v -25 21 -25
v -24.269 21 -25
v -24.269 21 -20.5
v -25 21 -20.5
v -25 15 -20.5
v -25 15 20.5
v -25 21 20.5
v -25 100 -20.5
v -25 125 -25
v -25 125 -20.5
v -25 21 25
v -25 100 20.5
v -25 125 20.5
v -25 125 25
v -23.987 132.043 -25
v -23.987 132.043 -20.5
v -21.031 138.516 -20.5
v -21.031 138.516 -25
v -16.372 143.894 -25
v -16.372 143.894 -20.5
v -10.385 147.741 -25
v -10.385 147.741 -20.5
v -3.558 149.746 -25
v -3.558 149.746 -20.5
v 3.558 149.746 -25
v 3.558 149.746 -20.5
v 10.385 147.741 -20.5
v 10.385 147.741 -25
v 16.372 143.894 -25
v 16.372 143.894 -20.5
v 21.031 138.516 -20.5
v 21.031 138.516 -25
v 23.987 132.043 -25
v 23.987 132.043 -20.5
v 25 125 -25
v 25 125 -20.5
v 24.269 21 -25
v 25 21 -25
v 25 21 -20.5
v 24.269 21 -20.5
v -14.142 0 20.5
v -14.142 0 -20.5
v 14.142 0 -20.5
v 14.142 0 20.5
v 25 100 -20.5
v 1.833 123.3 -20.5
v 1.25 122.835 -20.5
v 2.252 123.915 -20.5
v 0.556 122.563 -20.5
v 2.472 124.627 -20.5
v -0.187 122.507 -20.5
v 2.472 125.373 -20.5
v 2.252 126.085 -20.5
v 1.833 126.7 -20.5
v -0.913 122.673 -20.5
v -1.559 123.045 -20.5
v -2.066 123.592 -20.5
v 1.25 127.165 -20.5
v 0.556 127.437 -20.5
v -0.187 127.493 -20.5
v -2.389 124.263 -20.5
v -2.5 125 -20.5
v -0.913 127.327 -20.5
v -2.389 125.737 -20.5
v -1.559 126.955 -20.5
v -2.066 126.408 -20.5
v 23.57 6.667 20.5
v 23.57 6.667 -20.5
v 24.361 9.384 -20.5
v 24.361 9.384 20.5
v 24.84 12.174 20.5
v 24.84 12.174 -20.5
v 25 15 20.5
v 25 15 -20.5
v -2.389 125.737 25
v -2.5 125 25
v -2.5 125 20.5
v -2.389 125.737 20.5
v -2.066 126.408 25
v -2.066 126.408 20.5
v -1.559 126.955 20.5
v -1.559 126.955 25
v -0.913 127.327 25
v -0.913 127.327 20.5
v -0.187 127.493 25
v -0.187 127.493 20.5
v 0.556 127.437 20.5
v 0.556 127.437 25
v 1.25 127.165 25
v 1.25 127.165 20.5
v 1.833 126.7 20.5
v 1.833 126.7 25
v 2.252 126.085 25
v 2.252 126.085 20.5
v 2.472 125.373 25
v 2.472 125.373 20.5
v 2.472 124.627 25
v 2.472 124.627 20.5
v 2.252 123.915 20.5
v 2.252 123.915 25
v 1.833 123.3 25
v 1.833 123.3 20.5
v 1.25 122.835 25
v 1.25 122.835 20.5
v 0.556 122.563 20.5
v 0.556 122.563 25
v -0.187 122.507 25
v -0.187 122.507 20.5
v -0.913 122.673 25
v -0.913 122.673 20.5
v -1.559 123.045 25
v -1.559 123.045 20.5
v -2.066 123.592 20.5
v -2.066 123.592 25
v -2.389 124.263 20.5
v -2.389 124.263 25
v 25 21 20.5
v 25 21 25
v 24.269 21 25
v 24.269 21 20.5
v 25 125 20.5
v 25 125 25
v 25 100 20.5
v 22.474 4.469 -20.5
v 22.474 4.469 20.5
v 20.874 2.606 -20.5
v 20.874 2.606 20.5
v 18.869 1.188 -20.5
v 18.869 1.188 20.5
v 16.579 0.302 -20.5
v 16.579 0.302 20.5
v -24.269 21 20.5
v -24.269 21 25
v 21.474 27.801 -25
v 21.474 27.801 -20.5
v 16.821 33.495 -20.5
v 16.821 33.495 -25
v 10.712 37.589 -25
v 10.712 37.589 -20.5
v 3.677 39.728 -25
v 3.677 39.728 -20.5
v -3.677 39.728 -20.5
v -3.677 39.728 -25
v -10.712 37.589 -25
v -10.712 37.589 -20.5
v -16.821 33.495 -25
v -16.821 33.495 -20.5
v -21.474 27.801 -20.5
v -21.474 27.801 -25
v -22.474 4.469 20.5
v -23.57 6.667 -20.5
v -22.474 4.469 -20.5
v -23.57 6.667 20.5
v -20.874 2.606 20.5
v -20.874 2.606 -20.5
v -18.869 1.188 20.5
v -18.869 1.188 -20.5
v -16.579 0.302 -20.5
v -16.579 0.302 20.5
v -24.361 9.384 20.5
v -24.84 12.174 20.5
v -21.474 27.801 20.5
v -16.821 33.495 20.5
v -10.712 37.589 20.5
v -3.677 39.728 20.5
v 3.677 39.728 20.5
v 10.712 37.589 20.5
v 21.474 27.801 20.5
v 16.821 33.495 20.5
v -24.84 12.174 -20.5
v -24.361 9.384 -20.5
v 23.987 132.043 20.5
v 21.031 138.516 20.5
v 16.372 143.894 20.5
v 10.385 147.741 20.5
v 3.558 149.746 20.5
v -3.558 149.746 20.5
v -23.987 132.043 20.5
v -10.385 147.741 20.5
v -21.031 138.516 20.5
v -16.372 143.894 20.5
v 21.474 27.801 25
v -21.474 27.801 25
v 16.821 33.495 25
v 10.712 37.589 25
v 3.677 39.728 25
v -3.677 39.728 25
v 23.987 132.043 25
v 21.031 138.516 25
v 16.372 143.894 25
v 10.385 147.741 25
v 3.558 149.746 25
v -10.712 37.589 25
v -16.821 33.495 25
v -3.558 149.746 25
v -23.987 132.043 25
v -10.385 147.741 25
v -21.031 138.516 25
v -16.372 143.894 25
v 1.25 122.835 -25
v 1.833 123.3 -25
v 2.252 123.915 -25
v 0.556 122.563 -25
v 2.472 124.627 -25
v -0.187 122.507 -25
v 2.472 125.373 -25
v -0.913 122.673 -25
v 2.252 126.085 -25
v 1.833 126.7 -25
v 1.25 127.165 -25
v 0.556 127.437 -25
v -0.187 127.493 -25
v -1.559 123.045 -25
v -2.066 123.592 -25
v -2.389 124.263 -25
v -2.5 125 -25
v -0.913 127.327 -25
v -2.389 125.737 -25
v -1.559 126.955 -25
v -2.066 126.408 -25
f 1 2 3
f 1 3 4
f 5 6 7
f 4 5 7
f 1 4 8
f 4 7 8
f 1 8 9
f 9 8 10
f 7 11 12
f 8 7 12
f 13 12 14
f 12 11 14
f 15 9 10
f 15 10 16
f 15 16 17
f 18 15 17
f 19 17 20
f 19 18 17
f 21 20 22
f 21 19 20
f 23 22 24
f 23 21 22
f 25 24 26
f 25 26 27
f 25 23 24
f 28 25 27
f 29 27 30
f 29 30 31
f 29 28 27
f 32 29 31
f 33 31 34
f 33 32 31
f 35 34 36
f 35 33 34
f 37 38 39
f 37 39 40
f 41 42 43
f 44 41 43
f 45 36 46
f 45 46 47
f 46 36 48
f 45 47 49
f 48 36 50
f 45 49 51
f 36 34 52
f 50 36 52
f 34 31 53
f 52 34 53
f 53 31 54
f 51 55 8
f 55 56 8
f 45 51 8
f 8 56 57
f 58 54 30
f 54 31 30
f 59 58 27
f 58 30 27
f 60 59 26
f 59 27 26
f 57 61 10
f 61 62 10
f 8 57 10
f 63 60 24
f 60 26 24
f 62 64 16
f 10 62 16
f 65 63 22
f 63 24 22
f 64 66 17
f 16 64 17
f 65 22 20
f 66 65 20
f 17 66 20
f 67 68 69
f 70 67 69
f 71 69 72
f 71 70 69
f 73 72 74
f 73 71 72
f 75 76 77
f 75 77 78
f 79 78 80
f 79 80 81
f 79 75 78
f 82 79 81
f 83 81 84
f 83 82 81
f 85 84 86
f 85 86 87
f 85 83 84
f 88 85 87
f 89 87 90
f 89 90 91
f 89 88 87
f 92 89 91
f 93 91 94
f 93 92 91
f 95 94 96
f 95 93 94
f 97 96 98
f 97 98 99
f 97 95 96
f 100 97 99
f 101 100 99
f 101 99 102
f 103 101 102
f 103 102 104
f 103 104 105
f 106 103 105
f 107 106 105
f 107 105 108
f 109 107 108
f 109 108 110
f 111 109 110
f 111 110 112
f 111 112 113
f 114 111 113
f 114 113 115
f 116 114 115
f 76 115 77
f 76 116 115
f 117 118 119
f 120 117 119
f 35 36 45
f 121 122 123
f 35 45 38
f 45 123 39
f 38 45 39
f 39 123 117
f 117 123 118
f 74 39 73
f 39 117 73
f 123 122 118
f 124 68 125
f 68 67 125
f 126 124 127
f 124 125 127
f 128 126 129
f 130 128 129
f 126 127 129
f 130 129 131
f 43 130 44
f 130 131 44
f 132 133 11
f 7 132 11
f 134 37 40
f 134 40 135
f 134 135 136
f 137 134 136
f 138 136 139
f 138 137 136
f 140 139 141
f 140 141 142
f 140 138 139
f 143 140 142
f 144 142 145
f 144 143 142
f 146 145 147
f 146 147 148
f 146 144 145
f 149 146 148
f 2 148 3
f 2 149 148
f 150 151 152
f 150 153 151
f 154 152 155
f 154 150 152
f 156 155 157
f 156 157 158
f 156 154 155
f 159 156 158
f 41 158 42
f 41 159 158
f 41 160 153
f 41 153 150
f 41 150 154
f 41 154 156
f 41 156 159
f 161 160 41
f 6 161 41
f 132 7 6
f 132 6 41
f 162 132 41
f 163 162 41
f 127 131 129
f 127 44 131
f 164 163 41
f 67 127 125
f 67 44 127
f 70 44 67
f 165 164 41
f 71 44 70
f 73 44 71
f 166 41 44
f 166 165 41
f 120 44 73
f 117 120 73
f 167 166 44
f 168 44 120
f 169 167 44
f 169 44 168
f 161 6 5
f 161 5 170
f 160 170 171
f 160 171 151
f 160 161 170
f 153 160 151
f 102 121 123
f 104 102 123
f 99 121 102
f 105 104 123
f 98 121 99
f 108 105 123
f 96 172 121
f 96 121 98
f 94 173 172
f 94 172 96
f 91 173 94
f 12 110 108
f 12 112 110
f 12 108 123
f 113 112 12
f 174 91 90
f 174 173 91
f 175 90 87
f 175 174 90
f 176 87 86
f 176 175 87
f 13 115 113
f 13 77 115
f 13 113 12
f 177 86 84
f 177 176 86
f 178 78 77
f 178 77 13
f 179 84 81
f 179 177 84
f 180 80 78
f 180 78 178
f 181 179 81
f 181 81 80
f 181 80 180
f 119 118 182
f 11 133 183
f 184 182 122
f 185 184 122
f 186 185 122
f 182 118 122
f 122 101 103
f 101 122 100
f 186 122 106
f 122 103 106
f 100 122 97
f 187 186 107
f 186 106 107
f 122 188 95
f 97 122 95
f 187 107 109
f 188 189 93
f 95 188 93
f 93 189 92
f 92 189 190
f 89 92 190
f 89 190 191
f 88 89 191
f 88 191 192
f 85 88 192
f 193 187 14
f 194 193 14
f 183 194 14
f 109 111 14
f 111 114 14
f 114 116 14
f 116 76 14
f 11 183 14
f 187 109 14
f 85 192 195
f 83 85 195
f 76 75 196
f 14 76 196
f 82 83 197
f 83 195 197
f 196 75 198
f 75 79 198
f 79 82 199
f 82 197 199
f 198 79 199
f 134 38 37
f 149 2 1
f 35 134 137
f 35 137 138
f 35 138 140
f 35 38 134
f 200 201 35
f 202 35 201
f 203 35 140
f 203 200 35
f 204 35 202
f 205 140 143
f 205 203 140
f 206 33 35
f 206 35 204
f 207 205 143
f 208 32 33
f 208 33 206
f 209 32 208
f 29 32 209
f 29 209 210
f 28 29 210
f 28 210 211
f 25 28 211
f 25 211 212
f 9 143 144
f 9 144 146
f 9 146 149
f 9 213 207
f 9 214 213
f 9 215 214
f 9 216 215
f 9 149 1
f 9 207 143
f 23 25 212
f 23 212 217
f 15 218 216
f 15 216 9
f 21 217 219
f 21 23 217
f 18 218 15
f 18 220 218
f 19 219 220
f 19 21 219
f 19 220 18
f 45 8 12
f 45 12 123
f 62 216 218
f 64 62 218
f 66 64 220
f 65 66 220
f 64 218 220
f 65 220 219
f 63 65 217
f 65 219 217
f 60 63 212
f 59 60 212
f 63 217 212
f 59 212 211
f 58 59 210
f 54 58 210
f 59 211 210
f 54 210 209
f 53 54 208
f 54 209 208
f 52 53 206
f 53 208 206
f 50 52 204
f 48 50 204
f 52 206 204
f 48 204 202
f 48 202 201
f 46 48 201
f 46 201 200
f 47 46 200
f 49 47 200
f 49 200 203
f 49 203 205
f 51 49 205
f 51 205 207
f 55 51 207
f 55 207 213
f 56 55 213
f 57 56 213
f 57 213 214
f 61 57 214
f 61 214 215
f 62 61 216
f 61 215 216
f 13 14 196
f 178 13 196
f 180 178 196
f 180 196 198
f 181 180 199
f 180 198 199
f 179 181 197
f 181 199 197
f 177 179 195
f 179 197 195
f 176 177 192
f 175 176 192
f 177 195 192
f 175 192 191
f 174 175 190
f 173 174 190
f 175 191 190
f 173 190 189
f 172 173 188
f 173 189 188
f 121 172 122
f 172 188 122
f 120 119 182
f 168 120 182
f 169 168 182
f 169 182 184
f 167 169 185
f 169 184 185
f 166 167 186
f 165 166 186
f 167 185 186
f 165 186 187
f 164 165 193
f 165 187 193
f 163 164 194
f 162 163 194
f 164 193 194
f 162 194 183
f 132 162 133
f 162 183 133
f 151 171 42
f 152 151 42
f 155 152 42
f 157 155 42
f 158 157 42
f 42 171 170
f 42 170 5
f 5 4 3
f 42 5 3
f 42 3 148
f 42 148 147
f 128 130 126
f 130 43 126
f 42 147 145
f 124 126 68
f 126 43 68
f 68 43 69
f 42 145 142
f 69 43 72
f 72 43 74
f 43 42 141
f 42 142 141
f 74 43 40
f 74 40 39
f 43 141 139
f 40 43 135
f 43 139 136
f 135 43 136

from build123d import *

# Parameters (mm, degrees)
SKETCH1_W               = 50
SKETCH1_H               = 50
BOSS_EXTRUDE1_DEPTH     = 100
CUT_EXTRUDE1_DEPTH      = 4.5
SKETCH4_R               = 2.5
BOSS_EXTRUDE2_DEPTH     = 4.5
CUT_EXTRUDE2_DEPTH      = 159.730116865
CUT_EXTRUDE2_DEPTH_BACK = 159.730116865
FILLET1_R               = 10


with BuildPart() as part:
    # Sketch1 → Boss-Extrude1 (new body)
    with BuildSketch(Plane(origin=(0, 0, 0), x_dir=(1, 0, 0), z_dir=(0, 1, 0))):
        Rectangle(SKETCH1_W, SKETCH1_H)
    extrude(amount=BOSS_EXTRUDE1_DEPTH)

    # Sketch2 → Cut-Extrude1 (cut)
    with BuildSketch(Plane.XY.offset(25)):
        with BuildLine():
            Line((-25, 0), (25, 0))
            Line((25, 0), (25, 21))
            Line((25, 21), (24.269322199, 21))
            ThreePointArc((24.269322199, 21), (0, 40), (-24.269322199, 21))
            Line((-24.269322199, 21), (-25, 21))
            Line((-25, 21), (-25, 0))
        make_face()
    cut_extrude1 = extrude(amount=-CUT_EXTRUDE1_DEPTH, mode=Mode.SUBTRACT)

    # Mirror1: Cut-Extrude1 across plane
    add(cut_extrude1.mirror(Plane.XY), mode=Mode.SUBTRACT)

    # Sketch4 → Boss-Extrude2 (add)
    with BuildSketch(Plane(origin=(0, 0, -25), x_dir=(-1, 0, 0), z_dir=(0, 0, -1))):
        with BuildLine():
            Line((-25, 100), (25, 100))
            Line((25, 100), (25, 125))
            ThreePointArc((25, 125), (0, 150), (-25, 125))
            Line((-25, 125), (-25, 100))
        make_face()
        with Locations((0, 125)):
            Circle(SKETCH4_R, mode=Mode.SUBTRACT)
    boss_extrude2 = extrude(amount=-BOSS_EXTRUDE2_DEPTH)

    # Mirror2: Boss-Extrude2 across plane
    add(boss_extrude2.mirror(Plane.XY))

    # Sketch5 → Cut-Extrude2 (cut, two sides: drawn at the far end of the back side and taken through both)
    with BuildSketch(Plane(origin=(0, 0, -20.5), x_dir=(-1, 0, 0), z_dir=(0, 0, -1)).offset(-CUT_EXTRUDE2_DEPTH_BACK)):
        with BuildLine():
            Line((-25, 15), (-25, -11.716119479))
            Line((-25, -11.716119479), (25, -11.716119479))
            Line((25, -11.716119479), (25, 15))
            ThreePointArc((25, 15), (0, -10), (-25, 15))
        make_face()
    extrude(amount=CUT_EXTRUDE2_DEPTH + CUT_EXTRUDE2_DEPTH_BACK, mode=Mode.SUBTRACT)

    # Fillet1
    fillet1_edges = [part.edges().sort_by_distance(p)[0] for p in [
        (20, 0, 0),
        (-20, 0, 0),
    ]]
    fillet(fillet1_edges, radius=FILLET1_R)


solid = part.part
